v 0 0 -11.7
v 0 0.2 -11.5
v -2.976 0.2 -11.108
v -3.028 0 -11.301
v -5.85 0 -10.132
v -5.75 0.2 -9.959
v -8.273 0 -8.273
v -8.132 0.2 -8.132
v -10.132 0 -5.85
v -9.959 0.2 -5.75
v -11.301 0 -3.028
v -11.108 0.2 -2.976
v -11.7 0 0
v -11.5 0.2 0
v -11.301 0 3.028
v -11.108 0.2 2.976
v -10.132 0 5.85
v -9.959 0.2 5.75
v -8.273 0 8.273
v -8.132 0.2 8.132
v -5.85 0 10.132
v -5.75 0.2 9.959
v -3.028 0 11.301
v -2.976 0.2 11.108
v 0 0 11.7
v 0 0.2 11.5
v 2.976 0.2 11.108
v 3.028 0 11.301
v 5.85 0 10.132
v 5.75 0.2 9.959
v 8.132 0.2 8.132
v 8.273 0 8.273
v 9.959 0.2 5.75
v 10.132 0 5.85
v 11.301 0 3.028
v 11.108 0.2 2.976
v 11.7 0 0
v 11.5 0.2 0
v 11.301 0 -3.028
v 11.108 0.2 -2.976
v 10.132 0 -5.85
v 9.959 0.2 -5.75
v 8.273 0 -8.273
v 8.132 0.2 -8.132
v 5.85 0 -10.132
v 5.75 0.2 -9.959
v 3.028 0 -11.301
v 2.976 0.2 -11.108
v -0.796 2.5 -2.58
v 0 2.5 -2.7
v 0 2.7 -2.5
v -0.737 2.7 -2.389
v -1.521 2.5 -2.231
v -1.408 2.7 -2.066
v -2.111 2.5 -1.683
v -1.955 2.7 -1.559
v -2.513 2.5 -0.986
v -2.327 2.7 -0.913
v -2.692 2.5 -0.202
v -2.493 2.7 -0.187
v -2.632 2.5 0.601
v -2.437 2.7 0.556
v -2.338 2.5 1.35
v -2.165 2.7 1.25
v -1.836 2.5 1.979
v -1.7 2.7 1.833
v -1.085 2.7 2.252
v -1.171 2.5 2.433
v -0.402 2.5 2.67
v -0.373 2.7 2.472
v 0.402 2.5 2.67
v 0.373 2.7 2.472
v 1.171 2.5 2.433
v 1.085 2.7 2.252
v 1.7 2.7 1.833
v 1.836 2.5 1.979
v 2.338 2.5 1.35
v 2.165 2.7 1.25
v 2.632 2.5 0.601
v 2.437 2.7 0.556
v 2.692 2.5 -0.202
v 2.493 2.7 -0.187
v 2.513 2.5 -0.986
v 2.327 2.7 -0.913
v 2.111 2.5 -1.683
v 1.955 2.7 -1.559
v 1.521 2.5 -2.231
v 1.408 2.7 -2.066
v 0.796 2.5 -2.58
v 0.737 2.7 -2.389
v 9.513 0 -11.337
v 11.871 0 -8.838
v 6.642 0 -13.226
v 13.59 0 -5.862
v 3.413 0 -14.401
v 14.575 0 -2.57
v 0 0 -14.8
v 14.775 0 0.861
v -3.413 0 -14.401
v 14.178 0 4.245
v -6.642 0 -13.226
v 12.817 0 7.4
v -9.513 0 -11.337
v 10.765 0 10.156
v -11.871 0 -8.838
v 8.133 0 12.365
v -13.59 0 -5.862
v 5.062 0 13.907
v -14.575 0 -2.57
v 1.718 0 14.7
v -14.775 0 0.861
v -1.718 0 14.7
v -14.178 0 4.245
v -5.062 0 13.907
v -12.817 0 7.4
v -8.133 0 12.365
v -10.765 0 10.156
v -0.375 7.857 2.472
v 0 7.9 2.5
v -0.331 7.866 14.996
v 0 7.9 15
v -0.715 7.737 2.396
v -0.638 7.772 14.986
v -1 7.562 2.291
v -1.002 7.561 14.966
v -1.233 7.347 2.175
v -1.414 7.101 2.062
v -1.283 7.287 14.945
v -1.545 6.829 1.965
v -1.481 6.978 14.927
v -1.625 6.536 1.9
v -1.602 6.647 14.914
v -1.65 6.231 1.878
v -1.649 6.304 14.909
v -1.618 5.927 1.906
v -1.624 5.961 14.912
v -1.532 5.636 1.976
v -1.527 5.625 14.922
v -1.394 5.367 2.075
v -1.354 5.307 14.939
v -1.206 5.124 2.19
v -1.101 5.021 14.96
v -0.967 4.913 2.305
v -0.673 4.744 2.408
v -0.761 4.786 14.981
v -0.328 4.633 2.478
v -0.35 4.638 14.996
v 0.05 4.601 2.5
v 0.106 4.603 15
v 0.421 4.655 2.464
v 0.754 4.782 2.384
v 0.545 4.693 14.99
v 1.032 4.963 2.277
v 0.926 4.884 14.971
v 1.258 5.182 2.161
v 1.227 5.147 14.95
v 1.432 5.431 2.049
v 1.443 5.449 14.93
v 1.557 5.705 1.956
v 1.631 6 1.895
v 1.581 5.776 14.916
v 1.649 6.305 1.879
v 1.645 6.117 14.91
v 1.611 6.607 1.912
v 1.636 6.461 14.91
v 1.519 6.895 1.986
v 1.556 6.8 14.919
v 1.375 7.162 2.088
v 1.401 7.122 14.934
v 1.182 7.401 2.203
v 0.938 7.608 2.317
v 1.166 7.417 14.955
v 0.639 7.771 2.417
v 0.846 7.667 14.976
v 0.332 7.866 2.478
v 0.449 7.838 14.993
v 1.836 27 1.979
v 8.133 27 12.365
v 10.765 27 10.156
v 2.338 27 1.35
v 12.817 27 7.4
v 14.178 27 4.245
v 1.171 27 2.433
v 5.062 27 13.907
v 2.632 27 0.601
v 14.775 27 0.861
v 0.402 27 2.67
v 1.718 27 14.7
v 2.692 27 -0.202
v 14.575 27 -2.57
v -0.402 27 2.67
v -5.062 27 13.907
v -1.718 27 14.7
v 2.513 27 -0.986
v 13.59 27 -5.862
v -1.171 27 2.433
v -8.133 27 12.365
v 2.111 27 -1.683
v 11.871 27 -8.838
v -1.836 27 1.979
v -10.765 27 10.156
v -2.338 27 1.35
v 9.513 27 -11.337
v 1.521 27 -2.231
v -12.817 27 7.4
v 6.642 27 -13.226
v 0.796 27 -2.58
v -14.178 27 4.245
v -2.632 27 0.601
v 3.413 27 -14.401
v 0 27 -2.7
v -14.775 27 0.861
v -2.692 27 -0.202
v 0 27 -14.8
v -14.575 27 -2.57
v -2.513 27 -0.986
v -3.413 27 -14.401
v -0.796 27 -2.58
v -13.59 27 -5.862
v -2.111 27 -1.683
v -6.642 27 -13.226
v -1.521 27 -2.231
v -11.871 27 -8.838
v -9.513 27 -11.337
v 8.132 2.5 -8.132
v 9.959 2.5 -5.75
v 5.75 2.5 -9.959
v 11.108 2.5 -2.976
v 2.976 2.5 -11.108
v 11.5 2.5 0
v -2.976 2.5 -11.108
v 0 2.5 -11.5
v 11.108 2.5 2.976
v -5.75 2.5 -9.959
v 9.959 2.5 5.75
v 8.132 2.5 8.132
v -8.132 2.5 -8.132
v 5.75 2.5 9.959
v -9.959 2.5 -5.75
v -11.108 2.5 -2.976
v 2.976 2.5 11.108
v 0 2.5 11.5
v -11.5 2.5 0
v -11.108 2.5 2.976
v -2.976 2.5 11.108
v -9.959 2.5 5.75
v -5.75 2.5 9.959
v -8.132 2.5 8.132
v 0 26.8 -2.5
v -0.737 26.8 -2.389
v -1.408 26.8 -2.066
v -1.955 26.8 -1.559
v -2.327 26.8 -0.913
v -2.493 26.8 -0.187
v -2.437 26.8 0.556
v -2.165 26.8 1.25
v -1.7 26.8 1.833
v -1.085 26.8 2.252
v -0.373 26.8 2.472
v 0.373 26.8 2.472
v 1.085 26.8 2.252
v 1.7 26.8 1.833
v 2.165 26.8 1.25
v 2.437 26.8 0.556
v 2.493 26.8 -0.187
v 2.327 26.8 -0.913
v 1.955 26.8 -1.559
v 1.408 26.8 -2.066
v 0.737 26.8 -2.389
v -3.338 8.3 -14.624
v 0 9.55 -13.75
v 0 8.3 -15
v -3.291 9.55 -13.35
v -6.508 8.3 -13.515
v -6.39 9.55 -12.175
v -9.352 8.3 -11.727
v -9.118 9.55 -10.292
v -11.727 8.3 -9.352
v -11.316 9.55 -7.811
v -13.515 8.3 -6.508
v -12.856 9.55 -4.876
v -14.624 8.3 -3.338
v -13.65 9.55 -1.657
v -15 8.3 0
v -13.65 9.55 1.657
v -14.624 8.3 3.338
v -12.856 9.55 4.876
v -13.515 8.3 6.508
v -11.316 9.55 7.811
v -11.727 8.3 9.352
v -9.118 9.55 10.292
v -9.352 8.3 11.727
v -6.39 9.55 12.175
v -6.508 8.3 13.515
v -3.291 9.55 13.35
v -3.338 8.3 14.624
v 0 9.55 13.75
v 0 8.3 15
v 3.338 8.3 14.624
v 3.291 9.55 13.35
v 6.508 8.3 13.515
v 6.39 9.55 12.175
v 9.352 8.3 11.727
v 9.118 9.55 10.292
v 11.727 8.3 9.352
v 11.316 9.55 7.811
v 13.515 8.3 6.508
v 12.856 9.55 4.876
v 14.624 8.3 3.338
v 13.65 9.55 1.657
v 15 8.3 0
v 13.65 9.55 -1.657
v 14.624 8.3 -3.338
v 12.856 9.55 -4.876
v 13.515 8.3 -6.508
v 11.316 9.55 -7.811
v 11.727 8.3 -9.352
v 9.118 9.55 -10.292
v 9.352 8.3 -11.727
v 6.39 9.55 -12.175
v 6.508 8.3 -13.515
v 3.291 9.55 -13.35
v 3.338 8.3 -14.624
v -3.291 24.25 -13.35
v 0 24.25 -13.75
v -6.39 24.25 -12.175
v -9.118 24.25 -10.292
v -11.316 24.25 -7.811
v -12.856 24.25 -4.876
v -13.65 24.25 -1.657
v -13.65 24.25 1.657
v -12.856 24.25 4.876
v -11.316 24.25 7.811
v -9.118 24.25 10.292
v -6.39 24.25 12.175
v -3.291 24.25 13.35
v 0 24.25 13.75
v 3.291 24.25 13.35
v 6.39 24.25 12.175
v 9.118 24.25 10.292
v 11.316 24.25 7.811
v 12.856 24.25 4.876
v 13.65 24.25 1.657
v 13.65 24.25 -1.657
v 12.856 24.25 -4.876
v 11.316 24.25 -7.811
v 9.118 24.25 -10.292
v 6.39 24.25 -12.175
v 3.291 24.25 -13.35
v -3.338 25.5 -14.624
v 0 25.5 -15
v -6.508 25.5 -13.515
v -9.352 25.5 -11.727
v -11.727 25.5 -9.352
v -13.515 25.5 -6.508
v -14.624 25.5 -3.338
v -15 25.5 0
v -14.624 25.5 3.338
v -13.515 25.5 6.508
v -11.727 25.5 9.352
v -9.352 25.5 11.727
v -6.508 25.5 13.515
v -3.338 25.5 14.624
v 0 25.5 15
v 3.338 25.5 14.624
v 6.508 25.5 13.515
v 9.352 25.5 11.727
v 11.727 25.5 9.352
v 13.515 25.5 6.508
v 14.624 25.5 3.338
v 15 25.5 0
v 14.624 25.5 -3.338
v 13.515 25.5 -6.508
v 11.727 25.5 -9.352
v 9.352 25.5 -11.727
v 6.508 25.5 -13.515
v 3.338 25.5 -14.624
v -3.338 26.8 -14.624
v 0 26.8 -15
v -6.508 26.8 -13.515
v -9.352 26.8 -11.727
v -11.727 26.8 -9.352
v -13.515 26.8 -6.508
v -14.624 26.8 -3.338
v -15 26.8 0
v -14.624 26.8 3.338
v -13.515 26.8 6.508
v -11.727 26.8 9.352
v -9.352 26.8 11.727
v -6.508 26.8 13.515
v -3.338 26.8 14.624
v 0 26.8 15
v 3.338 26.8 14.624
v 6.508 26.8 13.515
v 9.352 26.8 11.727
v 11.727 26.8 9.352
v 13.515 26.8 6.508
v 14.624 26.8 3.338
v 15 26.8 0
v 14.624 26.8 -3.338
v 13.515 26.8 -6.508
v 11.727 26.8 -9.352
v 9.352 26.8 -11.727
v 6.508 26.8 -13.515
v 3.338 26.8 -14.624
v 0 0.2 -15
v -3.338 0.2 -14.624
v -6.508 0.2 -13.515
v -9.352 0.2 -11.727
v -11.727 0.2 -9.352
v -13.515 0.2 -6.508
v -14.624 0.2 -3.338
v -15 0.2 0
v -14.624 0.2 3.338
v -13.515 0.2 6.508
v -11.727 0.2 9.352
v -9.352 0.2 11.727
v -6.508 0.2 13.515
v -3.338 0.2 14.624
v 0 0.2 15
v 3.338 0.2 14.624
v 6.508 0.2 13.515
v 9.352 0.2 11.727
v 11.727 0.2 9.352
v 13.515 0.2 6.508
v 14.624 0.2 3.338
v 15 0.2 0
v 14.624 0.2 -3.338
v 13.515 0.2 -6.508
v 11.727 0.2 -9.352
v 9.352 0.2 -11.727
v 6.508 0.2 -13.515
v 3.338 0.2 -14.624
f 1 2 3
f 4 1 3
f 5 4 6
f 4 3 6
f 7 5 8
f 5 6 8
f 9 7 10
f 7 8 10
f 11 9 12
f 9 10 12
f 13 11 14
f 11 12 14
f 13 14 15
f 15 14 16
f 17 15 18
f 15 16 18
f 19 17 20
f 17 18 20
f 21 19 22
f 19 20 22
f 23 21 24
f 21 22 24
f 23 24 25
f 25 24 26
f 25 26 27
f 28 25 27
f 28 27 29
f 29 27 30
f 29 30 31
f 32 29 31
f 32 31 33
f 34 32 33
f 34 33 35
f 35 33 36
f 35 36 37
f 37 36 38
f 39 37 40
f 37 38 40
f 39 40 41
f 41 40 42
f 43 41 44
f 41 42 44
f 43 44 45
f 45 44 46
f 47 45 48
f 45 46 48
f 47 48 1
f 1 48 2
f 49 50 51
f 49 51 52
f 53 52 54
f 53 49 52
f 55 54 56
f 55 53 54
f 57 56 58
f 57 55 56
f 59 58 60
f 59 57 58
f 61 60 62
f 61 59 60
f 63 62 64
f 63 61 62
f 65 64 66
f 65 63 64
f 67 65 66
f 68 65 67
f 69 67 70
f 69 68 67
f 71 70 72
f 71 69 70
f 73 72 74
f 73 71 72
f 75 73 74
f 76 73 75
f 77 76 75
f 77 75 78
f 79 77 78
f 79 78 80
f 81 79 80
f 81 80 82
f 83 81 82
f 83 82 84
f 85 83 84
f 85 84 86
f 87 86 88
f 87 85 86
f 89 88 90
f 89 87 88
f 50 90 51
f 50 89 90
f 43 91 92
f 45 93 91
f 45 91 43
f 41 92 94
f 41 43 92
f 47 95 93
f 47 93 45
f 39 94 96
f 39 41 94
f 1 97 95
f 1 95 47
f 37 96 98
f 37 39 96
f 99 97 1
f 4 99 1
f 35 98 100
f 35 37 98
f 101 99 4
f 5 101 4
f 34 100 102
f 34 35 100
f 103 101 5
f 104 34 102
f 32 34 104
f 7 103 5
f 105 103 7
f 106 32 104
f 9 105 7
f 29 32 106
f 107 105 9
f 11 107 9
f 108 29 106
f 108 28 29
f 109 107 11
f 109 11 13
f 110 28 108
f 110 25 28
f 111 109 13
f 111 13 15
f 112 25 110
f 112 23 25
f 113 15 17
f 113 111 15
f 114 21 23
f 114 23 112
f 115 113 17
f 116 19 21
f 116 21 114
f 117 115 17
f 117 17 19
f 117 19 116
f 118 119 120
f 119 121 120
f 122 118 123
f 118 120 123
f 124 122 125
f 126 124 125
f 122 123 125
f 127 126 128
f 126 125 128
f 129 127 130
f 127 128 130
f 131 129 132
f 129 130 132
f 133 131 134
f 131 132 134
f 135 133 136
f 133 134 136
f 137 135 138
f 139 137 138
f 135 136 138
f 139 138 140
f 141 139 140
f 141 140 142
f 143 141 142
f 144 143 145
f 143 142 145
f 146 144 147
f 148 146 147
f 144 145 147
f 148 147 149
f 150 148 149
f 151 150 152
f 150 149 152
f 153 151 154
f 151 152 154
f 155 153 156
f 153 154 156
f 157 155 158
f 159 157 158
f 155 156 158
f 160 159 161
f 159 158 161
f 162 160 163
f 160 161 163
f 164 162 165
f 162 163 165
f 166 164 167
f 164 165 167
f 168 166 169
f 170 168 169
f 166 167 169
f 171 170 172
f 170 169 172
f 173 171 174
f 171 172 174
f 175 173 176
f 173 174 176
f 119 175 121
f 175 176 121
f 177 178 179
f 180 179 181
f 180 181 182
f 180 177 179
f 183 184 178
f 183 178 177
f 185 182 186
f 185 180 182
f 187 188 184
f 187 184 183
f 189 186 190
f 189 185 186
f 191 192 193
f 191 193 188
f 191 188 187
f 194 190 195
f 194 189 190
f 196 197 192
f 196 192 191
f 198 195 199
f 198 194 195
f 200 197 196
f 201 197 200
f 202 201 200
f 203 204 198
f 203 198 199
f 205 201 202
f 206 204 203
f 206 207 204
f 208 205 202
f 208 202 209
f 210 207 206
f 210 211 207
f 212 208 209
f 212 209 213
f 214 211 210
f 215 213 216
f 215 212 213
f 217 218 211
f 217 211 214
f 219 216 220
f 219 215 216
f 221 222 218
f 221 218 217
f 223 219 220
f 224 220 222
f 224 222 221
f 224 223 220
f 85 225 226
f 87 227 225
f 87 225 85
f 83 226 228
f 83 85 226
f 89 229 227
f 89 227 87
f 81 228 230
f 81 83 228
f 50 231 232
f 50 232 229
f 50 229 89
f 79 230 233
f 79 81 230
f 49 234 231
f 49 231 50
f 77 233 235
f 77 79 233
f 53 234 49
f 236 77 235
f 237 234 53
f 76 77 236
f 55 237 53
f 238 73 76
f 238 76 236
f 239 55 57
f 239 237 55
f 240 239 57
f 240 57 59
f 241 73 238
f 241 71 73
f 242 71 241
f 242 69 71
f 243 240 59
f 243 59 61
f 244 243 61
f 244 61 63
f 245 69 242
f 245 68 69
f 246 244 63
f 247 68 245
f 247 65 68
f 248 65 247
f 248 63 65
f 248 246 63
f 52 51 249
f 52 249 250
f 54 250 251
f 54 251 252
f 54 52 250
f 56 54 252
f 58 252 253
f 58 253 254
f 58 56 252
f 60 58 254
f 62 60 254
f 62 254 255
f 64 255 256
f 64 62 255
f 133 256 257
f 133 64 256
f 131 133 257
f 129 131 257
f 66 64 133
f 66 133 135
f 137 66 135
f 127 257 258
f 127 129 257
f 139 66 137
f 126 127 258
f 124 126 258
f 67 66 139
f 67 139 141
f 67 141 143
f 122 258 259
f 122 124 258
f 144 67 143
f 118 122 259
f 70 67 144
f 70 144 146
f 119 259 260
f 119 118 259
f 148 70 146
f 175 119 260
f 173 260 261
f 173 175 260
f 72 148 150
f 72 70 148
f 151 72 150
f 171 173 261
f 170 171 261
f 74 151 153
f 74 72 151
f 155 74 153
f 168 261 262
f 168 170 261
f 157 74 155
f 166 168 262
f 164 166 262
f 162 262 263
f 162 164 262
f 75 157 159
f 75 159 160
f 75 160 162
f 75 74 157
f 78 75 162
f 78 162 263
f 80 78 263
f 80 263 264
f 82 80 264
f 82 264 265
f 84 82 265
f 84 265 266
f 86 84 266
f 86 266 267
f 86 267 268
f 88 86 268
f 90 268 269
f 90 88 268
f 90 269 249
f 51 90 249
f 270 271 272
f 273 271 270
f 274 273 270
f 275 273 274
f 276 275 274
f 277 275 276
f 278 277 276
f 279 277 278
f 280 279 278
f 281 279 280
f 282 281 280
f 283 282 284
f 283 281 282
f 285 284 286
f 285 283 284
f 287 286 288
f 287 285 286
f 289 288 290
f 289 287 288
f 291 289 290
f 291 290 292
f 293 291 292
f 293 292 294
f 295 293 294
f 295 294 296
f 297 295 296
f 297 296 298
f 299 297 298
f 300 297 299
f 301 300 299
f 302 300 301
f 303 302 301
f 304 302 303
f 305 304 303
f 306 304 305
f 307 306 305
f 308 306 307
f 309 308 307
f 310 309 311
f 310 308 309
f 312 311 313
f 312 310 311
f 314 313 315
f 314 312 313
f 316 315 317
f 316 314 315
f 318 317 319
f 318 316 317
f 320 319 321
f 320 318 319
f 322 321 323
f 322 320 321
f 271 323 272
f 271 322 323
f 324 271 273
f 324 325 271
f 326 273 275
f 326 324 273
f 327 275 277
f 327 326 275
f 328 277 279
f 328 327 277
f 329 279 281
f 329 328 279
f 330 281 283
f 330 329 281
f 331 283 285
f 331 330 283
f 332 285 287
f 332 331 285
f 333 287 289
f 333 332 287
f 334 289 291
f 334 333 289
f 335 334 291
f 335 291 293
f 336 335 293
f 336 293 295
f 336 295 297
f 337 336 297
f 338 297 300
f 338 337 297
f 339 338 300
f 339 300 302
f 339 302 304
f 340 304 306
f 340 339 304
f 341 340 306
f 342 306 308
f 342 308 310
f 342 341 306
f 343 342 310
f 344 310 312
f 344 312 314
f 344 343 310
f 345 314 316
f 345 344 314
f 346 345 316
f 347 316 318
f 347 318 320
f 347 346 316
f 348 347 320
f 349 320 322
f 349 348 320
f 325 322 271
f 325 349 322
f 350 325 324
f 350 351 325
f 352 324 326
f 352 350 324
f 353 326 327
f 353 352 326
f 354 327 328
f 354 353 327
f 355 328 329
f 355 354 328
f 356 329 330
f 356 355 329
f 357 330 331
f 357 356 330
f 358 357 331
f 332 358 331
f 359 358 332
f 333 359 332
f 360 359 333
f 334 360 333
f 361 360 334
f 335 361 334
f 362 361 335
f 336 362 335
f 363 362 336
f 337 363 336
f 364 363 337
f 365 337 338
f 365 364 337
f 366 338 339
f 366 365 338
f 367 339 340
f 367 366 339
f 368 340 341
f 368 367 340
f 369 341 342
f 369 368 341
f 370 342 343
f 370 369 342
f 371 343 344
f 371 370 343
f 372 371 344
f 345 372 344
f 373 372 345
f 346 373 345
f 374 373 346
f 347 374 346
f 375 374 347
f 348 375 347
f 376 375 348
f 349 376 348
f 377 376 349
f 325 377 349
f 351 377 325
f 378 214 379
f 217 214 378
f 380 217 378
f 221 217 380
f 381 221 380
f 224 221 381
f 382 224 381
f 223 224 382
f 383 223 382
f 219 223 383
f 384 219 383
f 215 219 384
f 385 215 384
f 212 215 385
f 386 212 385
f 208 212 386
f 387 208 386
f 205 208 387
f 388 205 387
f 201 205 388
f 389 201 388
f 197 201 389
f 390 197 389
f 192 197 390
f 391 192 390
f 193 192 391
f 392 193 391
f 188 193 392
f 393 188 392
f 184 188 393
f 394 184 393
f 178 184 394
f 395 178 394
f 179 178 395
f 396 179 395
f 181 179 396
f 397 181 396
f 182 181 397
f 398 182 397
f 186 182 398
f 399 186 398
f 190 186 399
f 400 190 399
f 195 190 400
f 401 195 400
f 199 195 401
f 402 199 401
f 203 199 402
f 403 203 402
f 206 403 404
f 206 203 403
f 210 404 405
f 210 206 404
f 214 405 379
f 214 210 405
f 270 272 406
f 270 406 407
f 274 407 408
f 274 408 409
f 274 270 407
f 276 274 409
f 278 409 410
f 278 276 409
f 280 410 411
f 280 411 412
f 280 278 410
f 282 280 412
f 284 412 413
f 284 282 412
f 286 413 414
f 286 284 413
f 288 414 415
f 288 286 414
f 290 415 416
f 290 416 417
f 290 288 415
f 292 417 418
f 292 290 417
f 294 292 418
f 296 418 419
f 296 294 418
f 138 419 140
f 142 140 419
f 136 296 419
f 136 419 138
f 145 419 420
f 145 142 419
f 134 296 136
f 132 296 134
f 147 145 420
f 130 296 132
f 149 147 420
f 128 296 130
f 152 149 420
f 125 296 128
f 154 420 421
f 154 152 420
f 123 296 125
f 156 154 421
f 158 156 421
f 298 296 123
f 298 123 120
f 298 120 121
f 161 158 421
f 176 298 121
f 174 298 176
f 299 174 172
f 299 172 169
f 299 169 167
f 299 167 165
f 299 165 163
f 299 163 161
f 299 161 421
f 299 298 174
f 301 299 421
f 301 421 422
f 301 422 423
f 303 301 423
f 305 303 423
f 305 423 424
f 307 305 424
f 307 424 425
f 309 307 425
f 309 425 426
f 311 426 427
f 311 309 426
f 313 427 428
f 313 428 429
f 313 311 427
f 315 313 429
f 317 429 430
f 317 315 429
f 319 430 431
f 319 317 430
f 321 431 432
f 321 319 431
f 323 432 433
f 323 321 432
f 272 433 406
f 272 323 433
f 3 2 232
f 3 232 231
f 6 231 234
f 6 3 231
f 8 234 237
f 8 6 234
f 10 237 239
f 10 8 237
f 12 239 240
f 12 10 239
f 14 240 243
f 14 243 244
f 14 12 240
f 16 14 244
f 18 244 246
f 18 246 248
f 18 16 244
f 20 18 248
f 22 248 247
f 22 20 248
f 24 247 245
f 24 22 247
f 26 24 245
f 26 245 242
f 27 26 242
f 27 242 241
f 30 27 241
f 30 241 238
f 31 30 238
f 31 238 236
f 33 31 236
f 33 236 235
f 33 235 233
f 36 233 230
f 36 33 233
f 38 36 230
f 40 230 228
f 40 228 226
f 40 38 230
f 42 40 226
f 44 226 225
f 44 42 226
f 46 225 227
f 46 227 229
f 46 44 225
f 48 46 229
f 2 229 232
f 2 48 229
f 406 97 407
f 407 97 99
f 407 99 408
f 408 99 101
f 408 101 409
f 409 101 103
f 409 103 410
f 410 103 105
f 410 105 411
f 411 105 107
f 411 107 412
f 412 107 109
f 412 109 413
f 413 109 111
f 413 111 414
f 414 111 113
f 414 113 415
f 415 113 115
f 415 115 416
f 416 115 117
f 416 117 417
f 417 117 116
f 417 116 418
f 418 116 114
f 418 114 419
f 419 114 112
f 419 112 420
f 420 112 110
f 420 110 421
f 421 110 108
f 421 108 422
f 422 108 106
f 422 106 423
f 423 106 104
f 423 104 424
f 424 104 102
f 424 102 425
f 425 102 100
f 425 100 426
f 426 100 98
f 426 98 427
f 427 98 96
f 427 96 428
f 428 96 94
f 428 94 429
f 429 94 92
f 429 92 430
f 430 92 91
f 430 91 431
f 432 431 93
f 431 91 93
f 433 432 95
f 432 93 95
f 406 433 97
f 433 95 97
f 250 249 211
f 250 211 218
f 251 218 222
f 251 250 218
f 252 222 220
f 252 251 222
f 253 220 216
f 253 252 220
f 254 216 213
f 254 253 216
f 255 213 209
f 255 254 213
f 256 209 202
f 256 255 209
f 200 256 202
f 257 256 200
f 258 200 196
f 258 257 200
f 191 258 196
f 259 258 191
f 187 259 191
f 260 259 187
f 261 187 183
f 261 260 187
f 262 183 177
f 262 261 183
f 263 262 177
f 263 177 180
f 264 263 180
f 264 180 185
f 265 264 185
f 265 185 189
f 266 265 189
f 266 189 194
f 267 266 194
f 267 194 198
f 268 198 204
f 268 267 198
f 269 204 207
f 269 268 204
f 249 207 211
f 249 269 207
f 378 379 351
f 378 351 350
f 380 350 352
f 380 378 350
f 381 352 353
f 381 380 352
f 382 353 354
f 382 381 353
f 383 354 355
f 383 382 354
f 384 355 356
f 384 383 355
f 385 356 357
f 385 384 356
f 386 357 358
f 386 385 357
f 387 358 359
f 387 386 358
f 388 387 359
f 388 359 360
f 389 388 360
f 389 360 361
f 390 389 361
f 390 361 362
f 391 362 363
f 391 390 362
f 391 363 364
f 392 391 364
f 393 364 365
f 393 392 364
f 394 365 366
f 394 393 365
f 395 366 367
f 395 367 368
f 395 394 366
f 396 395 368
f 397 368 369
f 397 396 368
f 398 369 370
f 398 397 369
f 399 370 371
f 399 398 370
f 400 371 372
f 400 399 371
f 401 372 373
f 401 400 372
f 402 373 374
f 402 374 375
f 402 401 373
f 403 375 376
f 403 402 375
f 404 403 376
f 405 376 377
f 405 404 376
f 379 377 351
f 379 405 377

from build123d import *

# Parameters (mm, degrees)
SKETCH_21_W    = 1.65
SKETCH_21_H    = 15
CHAMFER_1_SIZE = 0.2


with BuildPart() as part:
    # Эскиз1 → Revolve 921 (revolve)
    with BuildSketch(Plane.XY, mode=Mode.PRIVATE) as revolve_921_sk:
        Polygon((13.75, 9.55), (13.75, 24.25), (15, 25.5), (15, 27), (2.5, 27), (2.5, 2.5), (11.5, 2.5), (11.5, 0), (15, 0), (15, 8.3), align=None)
    revolve(revolve_921_sk.sketch.rotate(Axis((0, 0, 0), (0, 1, 0)), 90), axis=Axis((0, 0, 0), (0, 1, 0)))

    # Эскиз21 → Фиксатор-M4 (revolve, cut)
    with BuildSketch(Plane(origin=(0, 6.25, 0), x_dir=(0, 1, 0), z_dir=(1, 0, 0))):
        with Locations((0.825, 7.5)):
            Rectangle(SKETCH_21_W, SKETCH_21_H)
    revolve(axis=Axis((0, 6.25, -6.35), (0, 0, 1)), mode=Mode.SUBTRACT)

    # Фаска1
    chamfer_1_edges = [part.edges().sort_by_distance(p)[0] for p in [
        (0, 0, 15),
        (0, 0, 11.5),
        (0, 2.5, 2.5),
        (0, 27, 2.5),
        (0, 27, 15),
    ]]
    chamfer(chamfer_1_edges, length=CHAMFER_1_SIZE)


solid = part.part
